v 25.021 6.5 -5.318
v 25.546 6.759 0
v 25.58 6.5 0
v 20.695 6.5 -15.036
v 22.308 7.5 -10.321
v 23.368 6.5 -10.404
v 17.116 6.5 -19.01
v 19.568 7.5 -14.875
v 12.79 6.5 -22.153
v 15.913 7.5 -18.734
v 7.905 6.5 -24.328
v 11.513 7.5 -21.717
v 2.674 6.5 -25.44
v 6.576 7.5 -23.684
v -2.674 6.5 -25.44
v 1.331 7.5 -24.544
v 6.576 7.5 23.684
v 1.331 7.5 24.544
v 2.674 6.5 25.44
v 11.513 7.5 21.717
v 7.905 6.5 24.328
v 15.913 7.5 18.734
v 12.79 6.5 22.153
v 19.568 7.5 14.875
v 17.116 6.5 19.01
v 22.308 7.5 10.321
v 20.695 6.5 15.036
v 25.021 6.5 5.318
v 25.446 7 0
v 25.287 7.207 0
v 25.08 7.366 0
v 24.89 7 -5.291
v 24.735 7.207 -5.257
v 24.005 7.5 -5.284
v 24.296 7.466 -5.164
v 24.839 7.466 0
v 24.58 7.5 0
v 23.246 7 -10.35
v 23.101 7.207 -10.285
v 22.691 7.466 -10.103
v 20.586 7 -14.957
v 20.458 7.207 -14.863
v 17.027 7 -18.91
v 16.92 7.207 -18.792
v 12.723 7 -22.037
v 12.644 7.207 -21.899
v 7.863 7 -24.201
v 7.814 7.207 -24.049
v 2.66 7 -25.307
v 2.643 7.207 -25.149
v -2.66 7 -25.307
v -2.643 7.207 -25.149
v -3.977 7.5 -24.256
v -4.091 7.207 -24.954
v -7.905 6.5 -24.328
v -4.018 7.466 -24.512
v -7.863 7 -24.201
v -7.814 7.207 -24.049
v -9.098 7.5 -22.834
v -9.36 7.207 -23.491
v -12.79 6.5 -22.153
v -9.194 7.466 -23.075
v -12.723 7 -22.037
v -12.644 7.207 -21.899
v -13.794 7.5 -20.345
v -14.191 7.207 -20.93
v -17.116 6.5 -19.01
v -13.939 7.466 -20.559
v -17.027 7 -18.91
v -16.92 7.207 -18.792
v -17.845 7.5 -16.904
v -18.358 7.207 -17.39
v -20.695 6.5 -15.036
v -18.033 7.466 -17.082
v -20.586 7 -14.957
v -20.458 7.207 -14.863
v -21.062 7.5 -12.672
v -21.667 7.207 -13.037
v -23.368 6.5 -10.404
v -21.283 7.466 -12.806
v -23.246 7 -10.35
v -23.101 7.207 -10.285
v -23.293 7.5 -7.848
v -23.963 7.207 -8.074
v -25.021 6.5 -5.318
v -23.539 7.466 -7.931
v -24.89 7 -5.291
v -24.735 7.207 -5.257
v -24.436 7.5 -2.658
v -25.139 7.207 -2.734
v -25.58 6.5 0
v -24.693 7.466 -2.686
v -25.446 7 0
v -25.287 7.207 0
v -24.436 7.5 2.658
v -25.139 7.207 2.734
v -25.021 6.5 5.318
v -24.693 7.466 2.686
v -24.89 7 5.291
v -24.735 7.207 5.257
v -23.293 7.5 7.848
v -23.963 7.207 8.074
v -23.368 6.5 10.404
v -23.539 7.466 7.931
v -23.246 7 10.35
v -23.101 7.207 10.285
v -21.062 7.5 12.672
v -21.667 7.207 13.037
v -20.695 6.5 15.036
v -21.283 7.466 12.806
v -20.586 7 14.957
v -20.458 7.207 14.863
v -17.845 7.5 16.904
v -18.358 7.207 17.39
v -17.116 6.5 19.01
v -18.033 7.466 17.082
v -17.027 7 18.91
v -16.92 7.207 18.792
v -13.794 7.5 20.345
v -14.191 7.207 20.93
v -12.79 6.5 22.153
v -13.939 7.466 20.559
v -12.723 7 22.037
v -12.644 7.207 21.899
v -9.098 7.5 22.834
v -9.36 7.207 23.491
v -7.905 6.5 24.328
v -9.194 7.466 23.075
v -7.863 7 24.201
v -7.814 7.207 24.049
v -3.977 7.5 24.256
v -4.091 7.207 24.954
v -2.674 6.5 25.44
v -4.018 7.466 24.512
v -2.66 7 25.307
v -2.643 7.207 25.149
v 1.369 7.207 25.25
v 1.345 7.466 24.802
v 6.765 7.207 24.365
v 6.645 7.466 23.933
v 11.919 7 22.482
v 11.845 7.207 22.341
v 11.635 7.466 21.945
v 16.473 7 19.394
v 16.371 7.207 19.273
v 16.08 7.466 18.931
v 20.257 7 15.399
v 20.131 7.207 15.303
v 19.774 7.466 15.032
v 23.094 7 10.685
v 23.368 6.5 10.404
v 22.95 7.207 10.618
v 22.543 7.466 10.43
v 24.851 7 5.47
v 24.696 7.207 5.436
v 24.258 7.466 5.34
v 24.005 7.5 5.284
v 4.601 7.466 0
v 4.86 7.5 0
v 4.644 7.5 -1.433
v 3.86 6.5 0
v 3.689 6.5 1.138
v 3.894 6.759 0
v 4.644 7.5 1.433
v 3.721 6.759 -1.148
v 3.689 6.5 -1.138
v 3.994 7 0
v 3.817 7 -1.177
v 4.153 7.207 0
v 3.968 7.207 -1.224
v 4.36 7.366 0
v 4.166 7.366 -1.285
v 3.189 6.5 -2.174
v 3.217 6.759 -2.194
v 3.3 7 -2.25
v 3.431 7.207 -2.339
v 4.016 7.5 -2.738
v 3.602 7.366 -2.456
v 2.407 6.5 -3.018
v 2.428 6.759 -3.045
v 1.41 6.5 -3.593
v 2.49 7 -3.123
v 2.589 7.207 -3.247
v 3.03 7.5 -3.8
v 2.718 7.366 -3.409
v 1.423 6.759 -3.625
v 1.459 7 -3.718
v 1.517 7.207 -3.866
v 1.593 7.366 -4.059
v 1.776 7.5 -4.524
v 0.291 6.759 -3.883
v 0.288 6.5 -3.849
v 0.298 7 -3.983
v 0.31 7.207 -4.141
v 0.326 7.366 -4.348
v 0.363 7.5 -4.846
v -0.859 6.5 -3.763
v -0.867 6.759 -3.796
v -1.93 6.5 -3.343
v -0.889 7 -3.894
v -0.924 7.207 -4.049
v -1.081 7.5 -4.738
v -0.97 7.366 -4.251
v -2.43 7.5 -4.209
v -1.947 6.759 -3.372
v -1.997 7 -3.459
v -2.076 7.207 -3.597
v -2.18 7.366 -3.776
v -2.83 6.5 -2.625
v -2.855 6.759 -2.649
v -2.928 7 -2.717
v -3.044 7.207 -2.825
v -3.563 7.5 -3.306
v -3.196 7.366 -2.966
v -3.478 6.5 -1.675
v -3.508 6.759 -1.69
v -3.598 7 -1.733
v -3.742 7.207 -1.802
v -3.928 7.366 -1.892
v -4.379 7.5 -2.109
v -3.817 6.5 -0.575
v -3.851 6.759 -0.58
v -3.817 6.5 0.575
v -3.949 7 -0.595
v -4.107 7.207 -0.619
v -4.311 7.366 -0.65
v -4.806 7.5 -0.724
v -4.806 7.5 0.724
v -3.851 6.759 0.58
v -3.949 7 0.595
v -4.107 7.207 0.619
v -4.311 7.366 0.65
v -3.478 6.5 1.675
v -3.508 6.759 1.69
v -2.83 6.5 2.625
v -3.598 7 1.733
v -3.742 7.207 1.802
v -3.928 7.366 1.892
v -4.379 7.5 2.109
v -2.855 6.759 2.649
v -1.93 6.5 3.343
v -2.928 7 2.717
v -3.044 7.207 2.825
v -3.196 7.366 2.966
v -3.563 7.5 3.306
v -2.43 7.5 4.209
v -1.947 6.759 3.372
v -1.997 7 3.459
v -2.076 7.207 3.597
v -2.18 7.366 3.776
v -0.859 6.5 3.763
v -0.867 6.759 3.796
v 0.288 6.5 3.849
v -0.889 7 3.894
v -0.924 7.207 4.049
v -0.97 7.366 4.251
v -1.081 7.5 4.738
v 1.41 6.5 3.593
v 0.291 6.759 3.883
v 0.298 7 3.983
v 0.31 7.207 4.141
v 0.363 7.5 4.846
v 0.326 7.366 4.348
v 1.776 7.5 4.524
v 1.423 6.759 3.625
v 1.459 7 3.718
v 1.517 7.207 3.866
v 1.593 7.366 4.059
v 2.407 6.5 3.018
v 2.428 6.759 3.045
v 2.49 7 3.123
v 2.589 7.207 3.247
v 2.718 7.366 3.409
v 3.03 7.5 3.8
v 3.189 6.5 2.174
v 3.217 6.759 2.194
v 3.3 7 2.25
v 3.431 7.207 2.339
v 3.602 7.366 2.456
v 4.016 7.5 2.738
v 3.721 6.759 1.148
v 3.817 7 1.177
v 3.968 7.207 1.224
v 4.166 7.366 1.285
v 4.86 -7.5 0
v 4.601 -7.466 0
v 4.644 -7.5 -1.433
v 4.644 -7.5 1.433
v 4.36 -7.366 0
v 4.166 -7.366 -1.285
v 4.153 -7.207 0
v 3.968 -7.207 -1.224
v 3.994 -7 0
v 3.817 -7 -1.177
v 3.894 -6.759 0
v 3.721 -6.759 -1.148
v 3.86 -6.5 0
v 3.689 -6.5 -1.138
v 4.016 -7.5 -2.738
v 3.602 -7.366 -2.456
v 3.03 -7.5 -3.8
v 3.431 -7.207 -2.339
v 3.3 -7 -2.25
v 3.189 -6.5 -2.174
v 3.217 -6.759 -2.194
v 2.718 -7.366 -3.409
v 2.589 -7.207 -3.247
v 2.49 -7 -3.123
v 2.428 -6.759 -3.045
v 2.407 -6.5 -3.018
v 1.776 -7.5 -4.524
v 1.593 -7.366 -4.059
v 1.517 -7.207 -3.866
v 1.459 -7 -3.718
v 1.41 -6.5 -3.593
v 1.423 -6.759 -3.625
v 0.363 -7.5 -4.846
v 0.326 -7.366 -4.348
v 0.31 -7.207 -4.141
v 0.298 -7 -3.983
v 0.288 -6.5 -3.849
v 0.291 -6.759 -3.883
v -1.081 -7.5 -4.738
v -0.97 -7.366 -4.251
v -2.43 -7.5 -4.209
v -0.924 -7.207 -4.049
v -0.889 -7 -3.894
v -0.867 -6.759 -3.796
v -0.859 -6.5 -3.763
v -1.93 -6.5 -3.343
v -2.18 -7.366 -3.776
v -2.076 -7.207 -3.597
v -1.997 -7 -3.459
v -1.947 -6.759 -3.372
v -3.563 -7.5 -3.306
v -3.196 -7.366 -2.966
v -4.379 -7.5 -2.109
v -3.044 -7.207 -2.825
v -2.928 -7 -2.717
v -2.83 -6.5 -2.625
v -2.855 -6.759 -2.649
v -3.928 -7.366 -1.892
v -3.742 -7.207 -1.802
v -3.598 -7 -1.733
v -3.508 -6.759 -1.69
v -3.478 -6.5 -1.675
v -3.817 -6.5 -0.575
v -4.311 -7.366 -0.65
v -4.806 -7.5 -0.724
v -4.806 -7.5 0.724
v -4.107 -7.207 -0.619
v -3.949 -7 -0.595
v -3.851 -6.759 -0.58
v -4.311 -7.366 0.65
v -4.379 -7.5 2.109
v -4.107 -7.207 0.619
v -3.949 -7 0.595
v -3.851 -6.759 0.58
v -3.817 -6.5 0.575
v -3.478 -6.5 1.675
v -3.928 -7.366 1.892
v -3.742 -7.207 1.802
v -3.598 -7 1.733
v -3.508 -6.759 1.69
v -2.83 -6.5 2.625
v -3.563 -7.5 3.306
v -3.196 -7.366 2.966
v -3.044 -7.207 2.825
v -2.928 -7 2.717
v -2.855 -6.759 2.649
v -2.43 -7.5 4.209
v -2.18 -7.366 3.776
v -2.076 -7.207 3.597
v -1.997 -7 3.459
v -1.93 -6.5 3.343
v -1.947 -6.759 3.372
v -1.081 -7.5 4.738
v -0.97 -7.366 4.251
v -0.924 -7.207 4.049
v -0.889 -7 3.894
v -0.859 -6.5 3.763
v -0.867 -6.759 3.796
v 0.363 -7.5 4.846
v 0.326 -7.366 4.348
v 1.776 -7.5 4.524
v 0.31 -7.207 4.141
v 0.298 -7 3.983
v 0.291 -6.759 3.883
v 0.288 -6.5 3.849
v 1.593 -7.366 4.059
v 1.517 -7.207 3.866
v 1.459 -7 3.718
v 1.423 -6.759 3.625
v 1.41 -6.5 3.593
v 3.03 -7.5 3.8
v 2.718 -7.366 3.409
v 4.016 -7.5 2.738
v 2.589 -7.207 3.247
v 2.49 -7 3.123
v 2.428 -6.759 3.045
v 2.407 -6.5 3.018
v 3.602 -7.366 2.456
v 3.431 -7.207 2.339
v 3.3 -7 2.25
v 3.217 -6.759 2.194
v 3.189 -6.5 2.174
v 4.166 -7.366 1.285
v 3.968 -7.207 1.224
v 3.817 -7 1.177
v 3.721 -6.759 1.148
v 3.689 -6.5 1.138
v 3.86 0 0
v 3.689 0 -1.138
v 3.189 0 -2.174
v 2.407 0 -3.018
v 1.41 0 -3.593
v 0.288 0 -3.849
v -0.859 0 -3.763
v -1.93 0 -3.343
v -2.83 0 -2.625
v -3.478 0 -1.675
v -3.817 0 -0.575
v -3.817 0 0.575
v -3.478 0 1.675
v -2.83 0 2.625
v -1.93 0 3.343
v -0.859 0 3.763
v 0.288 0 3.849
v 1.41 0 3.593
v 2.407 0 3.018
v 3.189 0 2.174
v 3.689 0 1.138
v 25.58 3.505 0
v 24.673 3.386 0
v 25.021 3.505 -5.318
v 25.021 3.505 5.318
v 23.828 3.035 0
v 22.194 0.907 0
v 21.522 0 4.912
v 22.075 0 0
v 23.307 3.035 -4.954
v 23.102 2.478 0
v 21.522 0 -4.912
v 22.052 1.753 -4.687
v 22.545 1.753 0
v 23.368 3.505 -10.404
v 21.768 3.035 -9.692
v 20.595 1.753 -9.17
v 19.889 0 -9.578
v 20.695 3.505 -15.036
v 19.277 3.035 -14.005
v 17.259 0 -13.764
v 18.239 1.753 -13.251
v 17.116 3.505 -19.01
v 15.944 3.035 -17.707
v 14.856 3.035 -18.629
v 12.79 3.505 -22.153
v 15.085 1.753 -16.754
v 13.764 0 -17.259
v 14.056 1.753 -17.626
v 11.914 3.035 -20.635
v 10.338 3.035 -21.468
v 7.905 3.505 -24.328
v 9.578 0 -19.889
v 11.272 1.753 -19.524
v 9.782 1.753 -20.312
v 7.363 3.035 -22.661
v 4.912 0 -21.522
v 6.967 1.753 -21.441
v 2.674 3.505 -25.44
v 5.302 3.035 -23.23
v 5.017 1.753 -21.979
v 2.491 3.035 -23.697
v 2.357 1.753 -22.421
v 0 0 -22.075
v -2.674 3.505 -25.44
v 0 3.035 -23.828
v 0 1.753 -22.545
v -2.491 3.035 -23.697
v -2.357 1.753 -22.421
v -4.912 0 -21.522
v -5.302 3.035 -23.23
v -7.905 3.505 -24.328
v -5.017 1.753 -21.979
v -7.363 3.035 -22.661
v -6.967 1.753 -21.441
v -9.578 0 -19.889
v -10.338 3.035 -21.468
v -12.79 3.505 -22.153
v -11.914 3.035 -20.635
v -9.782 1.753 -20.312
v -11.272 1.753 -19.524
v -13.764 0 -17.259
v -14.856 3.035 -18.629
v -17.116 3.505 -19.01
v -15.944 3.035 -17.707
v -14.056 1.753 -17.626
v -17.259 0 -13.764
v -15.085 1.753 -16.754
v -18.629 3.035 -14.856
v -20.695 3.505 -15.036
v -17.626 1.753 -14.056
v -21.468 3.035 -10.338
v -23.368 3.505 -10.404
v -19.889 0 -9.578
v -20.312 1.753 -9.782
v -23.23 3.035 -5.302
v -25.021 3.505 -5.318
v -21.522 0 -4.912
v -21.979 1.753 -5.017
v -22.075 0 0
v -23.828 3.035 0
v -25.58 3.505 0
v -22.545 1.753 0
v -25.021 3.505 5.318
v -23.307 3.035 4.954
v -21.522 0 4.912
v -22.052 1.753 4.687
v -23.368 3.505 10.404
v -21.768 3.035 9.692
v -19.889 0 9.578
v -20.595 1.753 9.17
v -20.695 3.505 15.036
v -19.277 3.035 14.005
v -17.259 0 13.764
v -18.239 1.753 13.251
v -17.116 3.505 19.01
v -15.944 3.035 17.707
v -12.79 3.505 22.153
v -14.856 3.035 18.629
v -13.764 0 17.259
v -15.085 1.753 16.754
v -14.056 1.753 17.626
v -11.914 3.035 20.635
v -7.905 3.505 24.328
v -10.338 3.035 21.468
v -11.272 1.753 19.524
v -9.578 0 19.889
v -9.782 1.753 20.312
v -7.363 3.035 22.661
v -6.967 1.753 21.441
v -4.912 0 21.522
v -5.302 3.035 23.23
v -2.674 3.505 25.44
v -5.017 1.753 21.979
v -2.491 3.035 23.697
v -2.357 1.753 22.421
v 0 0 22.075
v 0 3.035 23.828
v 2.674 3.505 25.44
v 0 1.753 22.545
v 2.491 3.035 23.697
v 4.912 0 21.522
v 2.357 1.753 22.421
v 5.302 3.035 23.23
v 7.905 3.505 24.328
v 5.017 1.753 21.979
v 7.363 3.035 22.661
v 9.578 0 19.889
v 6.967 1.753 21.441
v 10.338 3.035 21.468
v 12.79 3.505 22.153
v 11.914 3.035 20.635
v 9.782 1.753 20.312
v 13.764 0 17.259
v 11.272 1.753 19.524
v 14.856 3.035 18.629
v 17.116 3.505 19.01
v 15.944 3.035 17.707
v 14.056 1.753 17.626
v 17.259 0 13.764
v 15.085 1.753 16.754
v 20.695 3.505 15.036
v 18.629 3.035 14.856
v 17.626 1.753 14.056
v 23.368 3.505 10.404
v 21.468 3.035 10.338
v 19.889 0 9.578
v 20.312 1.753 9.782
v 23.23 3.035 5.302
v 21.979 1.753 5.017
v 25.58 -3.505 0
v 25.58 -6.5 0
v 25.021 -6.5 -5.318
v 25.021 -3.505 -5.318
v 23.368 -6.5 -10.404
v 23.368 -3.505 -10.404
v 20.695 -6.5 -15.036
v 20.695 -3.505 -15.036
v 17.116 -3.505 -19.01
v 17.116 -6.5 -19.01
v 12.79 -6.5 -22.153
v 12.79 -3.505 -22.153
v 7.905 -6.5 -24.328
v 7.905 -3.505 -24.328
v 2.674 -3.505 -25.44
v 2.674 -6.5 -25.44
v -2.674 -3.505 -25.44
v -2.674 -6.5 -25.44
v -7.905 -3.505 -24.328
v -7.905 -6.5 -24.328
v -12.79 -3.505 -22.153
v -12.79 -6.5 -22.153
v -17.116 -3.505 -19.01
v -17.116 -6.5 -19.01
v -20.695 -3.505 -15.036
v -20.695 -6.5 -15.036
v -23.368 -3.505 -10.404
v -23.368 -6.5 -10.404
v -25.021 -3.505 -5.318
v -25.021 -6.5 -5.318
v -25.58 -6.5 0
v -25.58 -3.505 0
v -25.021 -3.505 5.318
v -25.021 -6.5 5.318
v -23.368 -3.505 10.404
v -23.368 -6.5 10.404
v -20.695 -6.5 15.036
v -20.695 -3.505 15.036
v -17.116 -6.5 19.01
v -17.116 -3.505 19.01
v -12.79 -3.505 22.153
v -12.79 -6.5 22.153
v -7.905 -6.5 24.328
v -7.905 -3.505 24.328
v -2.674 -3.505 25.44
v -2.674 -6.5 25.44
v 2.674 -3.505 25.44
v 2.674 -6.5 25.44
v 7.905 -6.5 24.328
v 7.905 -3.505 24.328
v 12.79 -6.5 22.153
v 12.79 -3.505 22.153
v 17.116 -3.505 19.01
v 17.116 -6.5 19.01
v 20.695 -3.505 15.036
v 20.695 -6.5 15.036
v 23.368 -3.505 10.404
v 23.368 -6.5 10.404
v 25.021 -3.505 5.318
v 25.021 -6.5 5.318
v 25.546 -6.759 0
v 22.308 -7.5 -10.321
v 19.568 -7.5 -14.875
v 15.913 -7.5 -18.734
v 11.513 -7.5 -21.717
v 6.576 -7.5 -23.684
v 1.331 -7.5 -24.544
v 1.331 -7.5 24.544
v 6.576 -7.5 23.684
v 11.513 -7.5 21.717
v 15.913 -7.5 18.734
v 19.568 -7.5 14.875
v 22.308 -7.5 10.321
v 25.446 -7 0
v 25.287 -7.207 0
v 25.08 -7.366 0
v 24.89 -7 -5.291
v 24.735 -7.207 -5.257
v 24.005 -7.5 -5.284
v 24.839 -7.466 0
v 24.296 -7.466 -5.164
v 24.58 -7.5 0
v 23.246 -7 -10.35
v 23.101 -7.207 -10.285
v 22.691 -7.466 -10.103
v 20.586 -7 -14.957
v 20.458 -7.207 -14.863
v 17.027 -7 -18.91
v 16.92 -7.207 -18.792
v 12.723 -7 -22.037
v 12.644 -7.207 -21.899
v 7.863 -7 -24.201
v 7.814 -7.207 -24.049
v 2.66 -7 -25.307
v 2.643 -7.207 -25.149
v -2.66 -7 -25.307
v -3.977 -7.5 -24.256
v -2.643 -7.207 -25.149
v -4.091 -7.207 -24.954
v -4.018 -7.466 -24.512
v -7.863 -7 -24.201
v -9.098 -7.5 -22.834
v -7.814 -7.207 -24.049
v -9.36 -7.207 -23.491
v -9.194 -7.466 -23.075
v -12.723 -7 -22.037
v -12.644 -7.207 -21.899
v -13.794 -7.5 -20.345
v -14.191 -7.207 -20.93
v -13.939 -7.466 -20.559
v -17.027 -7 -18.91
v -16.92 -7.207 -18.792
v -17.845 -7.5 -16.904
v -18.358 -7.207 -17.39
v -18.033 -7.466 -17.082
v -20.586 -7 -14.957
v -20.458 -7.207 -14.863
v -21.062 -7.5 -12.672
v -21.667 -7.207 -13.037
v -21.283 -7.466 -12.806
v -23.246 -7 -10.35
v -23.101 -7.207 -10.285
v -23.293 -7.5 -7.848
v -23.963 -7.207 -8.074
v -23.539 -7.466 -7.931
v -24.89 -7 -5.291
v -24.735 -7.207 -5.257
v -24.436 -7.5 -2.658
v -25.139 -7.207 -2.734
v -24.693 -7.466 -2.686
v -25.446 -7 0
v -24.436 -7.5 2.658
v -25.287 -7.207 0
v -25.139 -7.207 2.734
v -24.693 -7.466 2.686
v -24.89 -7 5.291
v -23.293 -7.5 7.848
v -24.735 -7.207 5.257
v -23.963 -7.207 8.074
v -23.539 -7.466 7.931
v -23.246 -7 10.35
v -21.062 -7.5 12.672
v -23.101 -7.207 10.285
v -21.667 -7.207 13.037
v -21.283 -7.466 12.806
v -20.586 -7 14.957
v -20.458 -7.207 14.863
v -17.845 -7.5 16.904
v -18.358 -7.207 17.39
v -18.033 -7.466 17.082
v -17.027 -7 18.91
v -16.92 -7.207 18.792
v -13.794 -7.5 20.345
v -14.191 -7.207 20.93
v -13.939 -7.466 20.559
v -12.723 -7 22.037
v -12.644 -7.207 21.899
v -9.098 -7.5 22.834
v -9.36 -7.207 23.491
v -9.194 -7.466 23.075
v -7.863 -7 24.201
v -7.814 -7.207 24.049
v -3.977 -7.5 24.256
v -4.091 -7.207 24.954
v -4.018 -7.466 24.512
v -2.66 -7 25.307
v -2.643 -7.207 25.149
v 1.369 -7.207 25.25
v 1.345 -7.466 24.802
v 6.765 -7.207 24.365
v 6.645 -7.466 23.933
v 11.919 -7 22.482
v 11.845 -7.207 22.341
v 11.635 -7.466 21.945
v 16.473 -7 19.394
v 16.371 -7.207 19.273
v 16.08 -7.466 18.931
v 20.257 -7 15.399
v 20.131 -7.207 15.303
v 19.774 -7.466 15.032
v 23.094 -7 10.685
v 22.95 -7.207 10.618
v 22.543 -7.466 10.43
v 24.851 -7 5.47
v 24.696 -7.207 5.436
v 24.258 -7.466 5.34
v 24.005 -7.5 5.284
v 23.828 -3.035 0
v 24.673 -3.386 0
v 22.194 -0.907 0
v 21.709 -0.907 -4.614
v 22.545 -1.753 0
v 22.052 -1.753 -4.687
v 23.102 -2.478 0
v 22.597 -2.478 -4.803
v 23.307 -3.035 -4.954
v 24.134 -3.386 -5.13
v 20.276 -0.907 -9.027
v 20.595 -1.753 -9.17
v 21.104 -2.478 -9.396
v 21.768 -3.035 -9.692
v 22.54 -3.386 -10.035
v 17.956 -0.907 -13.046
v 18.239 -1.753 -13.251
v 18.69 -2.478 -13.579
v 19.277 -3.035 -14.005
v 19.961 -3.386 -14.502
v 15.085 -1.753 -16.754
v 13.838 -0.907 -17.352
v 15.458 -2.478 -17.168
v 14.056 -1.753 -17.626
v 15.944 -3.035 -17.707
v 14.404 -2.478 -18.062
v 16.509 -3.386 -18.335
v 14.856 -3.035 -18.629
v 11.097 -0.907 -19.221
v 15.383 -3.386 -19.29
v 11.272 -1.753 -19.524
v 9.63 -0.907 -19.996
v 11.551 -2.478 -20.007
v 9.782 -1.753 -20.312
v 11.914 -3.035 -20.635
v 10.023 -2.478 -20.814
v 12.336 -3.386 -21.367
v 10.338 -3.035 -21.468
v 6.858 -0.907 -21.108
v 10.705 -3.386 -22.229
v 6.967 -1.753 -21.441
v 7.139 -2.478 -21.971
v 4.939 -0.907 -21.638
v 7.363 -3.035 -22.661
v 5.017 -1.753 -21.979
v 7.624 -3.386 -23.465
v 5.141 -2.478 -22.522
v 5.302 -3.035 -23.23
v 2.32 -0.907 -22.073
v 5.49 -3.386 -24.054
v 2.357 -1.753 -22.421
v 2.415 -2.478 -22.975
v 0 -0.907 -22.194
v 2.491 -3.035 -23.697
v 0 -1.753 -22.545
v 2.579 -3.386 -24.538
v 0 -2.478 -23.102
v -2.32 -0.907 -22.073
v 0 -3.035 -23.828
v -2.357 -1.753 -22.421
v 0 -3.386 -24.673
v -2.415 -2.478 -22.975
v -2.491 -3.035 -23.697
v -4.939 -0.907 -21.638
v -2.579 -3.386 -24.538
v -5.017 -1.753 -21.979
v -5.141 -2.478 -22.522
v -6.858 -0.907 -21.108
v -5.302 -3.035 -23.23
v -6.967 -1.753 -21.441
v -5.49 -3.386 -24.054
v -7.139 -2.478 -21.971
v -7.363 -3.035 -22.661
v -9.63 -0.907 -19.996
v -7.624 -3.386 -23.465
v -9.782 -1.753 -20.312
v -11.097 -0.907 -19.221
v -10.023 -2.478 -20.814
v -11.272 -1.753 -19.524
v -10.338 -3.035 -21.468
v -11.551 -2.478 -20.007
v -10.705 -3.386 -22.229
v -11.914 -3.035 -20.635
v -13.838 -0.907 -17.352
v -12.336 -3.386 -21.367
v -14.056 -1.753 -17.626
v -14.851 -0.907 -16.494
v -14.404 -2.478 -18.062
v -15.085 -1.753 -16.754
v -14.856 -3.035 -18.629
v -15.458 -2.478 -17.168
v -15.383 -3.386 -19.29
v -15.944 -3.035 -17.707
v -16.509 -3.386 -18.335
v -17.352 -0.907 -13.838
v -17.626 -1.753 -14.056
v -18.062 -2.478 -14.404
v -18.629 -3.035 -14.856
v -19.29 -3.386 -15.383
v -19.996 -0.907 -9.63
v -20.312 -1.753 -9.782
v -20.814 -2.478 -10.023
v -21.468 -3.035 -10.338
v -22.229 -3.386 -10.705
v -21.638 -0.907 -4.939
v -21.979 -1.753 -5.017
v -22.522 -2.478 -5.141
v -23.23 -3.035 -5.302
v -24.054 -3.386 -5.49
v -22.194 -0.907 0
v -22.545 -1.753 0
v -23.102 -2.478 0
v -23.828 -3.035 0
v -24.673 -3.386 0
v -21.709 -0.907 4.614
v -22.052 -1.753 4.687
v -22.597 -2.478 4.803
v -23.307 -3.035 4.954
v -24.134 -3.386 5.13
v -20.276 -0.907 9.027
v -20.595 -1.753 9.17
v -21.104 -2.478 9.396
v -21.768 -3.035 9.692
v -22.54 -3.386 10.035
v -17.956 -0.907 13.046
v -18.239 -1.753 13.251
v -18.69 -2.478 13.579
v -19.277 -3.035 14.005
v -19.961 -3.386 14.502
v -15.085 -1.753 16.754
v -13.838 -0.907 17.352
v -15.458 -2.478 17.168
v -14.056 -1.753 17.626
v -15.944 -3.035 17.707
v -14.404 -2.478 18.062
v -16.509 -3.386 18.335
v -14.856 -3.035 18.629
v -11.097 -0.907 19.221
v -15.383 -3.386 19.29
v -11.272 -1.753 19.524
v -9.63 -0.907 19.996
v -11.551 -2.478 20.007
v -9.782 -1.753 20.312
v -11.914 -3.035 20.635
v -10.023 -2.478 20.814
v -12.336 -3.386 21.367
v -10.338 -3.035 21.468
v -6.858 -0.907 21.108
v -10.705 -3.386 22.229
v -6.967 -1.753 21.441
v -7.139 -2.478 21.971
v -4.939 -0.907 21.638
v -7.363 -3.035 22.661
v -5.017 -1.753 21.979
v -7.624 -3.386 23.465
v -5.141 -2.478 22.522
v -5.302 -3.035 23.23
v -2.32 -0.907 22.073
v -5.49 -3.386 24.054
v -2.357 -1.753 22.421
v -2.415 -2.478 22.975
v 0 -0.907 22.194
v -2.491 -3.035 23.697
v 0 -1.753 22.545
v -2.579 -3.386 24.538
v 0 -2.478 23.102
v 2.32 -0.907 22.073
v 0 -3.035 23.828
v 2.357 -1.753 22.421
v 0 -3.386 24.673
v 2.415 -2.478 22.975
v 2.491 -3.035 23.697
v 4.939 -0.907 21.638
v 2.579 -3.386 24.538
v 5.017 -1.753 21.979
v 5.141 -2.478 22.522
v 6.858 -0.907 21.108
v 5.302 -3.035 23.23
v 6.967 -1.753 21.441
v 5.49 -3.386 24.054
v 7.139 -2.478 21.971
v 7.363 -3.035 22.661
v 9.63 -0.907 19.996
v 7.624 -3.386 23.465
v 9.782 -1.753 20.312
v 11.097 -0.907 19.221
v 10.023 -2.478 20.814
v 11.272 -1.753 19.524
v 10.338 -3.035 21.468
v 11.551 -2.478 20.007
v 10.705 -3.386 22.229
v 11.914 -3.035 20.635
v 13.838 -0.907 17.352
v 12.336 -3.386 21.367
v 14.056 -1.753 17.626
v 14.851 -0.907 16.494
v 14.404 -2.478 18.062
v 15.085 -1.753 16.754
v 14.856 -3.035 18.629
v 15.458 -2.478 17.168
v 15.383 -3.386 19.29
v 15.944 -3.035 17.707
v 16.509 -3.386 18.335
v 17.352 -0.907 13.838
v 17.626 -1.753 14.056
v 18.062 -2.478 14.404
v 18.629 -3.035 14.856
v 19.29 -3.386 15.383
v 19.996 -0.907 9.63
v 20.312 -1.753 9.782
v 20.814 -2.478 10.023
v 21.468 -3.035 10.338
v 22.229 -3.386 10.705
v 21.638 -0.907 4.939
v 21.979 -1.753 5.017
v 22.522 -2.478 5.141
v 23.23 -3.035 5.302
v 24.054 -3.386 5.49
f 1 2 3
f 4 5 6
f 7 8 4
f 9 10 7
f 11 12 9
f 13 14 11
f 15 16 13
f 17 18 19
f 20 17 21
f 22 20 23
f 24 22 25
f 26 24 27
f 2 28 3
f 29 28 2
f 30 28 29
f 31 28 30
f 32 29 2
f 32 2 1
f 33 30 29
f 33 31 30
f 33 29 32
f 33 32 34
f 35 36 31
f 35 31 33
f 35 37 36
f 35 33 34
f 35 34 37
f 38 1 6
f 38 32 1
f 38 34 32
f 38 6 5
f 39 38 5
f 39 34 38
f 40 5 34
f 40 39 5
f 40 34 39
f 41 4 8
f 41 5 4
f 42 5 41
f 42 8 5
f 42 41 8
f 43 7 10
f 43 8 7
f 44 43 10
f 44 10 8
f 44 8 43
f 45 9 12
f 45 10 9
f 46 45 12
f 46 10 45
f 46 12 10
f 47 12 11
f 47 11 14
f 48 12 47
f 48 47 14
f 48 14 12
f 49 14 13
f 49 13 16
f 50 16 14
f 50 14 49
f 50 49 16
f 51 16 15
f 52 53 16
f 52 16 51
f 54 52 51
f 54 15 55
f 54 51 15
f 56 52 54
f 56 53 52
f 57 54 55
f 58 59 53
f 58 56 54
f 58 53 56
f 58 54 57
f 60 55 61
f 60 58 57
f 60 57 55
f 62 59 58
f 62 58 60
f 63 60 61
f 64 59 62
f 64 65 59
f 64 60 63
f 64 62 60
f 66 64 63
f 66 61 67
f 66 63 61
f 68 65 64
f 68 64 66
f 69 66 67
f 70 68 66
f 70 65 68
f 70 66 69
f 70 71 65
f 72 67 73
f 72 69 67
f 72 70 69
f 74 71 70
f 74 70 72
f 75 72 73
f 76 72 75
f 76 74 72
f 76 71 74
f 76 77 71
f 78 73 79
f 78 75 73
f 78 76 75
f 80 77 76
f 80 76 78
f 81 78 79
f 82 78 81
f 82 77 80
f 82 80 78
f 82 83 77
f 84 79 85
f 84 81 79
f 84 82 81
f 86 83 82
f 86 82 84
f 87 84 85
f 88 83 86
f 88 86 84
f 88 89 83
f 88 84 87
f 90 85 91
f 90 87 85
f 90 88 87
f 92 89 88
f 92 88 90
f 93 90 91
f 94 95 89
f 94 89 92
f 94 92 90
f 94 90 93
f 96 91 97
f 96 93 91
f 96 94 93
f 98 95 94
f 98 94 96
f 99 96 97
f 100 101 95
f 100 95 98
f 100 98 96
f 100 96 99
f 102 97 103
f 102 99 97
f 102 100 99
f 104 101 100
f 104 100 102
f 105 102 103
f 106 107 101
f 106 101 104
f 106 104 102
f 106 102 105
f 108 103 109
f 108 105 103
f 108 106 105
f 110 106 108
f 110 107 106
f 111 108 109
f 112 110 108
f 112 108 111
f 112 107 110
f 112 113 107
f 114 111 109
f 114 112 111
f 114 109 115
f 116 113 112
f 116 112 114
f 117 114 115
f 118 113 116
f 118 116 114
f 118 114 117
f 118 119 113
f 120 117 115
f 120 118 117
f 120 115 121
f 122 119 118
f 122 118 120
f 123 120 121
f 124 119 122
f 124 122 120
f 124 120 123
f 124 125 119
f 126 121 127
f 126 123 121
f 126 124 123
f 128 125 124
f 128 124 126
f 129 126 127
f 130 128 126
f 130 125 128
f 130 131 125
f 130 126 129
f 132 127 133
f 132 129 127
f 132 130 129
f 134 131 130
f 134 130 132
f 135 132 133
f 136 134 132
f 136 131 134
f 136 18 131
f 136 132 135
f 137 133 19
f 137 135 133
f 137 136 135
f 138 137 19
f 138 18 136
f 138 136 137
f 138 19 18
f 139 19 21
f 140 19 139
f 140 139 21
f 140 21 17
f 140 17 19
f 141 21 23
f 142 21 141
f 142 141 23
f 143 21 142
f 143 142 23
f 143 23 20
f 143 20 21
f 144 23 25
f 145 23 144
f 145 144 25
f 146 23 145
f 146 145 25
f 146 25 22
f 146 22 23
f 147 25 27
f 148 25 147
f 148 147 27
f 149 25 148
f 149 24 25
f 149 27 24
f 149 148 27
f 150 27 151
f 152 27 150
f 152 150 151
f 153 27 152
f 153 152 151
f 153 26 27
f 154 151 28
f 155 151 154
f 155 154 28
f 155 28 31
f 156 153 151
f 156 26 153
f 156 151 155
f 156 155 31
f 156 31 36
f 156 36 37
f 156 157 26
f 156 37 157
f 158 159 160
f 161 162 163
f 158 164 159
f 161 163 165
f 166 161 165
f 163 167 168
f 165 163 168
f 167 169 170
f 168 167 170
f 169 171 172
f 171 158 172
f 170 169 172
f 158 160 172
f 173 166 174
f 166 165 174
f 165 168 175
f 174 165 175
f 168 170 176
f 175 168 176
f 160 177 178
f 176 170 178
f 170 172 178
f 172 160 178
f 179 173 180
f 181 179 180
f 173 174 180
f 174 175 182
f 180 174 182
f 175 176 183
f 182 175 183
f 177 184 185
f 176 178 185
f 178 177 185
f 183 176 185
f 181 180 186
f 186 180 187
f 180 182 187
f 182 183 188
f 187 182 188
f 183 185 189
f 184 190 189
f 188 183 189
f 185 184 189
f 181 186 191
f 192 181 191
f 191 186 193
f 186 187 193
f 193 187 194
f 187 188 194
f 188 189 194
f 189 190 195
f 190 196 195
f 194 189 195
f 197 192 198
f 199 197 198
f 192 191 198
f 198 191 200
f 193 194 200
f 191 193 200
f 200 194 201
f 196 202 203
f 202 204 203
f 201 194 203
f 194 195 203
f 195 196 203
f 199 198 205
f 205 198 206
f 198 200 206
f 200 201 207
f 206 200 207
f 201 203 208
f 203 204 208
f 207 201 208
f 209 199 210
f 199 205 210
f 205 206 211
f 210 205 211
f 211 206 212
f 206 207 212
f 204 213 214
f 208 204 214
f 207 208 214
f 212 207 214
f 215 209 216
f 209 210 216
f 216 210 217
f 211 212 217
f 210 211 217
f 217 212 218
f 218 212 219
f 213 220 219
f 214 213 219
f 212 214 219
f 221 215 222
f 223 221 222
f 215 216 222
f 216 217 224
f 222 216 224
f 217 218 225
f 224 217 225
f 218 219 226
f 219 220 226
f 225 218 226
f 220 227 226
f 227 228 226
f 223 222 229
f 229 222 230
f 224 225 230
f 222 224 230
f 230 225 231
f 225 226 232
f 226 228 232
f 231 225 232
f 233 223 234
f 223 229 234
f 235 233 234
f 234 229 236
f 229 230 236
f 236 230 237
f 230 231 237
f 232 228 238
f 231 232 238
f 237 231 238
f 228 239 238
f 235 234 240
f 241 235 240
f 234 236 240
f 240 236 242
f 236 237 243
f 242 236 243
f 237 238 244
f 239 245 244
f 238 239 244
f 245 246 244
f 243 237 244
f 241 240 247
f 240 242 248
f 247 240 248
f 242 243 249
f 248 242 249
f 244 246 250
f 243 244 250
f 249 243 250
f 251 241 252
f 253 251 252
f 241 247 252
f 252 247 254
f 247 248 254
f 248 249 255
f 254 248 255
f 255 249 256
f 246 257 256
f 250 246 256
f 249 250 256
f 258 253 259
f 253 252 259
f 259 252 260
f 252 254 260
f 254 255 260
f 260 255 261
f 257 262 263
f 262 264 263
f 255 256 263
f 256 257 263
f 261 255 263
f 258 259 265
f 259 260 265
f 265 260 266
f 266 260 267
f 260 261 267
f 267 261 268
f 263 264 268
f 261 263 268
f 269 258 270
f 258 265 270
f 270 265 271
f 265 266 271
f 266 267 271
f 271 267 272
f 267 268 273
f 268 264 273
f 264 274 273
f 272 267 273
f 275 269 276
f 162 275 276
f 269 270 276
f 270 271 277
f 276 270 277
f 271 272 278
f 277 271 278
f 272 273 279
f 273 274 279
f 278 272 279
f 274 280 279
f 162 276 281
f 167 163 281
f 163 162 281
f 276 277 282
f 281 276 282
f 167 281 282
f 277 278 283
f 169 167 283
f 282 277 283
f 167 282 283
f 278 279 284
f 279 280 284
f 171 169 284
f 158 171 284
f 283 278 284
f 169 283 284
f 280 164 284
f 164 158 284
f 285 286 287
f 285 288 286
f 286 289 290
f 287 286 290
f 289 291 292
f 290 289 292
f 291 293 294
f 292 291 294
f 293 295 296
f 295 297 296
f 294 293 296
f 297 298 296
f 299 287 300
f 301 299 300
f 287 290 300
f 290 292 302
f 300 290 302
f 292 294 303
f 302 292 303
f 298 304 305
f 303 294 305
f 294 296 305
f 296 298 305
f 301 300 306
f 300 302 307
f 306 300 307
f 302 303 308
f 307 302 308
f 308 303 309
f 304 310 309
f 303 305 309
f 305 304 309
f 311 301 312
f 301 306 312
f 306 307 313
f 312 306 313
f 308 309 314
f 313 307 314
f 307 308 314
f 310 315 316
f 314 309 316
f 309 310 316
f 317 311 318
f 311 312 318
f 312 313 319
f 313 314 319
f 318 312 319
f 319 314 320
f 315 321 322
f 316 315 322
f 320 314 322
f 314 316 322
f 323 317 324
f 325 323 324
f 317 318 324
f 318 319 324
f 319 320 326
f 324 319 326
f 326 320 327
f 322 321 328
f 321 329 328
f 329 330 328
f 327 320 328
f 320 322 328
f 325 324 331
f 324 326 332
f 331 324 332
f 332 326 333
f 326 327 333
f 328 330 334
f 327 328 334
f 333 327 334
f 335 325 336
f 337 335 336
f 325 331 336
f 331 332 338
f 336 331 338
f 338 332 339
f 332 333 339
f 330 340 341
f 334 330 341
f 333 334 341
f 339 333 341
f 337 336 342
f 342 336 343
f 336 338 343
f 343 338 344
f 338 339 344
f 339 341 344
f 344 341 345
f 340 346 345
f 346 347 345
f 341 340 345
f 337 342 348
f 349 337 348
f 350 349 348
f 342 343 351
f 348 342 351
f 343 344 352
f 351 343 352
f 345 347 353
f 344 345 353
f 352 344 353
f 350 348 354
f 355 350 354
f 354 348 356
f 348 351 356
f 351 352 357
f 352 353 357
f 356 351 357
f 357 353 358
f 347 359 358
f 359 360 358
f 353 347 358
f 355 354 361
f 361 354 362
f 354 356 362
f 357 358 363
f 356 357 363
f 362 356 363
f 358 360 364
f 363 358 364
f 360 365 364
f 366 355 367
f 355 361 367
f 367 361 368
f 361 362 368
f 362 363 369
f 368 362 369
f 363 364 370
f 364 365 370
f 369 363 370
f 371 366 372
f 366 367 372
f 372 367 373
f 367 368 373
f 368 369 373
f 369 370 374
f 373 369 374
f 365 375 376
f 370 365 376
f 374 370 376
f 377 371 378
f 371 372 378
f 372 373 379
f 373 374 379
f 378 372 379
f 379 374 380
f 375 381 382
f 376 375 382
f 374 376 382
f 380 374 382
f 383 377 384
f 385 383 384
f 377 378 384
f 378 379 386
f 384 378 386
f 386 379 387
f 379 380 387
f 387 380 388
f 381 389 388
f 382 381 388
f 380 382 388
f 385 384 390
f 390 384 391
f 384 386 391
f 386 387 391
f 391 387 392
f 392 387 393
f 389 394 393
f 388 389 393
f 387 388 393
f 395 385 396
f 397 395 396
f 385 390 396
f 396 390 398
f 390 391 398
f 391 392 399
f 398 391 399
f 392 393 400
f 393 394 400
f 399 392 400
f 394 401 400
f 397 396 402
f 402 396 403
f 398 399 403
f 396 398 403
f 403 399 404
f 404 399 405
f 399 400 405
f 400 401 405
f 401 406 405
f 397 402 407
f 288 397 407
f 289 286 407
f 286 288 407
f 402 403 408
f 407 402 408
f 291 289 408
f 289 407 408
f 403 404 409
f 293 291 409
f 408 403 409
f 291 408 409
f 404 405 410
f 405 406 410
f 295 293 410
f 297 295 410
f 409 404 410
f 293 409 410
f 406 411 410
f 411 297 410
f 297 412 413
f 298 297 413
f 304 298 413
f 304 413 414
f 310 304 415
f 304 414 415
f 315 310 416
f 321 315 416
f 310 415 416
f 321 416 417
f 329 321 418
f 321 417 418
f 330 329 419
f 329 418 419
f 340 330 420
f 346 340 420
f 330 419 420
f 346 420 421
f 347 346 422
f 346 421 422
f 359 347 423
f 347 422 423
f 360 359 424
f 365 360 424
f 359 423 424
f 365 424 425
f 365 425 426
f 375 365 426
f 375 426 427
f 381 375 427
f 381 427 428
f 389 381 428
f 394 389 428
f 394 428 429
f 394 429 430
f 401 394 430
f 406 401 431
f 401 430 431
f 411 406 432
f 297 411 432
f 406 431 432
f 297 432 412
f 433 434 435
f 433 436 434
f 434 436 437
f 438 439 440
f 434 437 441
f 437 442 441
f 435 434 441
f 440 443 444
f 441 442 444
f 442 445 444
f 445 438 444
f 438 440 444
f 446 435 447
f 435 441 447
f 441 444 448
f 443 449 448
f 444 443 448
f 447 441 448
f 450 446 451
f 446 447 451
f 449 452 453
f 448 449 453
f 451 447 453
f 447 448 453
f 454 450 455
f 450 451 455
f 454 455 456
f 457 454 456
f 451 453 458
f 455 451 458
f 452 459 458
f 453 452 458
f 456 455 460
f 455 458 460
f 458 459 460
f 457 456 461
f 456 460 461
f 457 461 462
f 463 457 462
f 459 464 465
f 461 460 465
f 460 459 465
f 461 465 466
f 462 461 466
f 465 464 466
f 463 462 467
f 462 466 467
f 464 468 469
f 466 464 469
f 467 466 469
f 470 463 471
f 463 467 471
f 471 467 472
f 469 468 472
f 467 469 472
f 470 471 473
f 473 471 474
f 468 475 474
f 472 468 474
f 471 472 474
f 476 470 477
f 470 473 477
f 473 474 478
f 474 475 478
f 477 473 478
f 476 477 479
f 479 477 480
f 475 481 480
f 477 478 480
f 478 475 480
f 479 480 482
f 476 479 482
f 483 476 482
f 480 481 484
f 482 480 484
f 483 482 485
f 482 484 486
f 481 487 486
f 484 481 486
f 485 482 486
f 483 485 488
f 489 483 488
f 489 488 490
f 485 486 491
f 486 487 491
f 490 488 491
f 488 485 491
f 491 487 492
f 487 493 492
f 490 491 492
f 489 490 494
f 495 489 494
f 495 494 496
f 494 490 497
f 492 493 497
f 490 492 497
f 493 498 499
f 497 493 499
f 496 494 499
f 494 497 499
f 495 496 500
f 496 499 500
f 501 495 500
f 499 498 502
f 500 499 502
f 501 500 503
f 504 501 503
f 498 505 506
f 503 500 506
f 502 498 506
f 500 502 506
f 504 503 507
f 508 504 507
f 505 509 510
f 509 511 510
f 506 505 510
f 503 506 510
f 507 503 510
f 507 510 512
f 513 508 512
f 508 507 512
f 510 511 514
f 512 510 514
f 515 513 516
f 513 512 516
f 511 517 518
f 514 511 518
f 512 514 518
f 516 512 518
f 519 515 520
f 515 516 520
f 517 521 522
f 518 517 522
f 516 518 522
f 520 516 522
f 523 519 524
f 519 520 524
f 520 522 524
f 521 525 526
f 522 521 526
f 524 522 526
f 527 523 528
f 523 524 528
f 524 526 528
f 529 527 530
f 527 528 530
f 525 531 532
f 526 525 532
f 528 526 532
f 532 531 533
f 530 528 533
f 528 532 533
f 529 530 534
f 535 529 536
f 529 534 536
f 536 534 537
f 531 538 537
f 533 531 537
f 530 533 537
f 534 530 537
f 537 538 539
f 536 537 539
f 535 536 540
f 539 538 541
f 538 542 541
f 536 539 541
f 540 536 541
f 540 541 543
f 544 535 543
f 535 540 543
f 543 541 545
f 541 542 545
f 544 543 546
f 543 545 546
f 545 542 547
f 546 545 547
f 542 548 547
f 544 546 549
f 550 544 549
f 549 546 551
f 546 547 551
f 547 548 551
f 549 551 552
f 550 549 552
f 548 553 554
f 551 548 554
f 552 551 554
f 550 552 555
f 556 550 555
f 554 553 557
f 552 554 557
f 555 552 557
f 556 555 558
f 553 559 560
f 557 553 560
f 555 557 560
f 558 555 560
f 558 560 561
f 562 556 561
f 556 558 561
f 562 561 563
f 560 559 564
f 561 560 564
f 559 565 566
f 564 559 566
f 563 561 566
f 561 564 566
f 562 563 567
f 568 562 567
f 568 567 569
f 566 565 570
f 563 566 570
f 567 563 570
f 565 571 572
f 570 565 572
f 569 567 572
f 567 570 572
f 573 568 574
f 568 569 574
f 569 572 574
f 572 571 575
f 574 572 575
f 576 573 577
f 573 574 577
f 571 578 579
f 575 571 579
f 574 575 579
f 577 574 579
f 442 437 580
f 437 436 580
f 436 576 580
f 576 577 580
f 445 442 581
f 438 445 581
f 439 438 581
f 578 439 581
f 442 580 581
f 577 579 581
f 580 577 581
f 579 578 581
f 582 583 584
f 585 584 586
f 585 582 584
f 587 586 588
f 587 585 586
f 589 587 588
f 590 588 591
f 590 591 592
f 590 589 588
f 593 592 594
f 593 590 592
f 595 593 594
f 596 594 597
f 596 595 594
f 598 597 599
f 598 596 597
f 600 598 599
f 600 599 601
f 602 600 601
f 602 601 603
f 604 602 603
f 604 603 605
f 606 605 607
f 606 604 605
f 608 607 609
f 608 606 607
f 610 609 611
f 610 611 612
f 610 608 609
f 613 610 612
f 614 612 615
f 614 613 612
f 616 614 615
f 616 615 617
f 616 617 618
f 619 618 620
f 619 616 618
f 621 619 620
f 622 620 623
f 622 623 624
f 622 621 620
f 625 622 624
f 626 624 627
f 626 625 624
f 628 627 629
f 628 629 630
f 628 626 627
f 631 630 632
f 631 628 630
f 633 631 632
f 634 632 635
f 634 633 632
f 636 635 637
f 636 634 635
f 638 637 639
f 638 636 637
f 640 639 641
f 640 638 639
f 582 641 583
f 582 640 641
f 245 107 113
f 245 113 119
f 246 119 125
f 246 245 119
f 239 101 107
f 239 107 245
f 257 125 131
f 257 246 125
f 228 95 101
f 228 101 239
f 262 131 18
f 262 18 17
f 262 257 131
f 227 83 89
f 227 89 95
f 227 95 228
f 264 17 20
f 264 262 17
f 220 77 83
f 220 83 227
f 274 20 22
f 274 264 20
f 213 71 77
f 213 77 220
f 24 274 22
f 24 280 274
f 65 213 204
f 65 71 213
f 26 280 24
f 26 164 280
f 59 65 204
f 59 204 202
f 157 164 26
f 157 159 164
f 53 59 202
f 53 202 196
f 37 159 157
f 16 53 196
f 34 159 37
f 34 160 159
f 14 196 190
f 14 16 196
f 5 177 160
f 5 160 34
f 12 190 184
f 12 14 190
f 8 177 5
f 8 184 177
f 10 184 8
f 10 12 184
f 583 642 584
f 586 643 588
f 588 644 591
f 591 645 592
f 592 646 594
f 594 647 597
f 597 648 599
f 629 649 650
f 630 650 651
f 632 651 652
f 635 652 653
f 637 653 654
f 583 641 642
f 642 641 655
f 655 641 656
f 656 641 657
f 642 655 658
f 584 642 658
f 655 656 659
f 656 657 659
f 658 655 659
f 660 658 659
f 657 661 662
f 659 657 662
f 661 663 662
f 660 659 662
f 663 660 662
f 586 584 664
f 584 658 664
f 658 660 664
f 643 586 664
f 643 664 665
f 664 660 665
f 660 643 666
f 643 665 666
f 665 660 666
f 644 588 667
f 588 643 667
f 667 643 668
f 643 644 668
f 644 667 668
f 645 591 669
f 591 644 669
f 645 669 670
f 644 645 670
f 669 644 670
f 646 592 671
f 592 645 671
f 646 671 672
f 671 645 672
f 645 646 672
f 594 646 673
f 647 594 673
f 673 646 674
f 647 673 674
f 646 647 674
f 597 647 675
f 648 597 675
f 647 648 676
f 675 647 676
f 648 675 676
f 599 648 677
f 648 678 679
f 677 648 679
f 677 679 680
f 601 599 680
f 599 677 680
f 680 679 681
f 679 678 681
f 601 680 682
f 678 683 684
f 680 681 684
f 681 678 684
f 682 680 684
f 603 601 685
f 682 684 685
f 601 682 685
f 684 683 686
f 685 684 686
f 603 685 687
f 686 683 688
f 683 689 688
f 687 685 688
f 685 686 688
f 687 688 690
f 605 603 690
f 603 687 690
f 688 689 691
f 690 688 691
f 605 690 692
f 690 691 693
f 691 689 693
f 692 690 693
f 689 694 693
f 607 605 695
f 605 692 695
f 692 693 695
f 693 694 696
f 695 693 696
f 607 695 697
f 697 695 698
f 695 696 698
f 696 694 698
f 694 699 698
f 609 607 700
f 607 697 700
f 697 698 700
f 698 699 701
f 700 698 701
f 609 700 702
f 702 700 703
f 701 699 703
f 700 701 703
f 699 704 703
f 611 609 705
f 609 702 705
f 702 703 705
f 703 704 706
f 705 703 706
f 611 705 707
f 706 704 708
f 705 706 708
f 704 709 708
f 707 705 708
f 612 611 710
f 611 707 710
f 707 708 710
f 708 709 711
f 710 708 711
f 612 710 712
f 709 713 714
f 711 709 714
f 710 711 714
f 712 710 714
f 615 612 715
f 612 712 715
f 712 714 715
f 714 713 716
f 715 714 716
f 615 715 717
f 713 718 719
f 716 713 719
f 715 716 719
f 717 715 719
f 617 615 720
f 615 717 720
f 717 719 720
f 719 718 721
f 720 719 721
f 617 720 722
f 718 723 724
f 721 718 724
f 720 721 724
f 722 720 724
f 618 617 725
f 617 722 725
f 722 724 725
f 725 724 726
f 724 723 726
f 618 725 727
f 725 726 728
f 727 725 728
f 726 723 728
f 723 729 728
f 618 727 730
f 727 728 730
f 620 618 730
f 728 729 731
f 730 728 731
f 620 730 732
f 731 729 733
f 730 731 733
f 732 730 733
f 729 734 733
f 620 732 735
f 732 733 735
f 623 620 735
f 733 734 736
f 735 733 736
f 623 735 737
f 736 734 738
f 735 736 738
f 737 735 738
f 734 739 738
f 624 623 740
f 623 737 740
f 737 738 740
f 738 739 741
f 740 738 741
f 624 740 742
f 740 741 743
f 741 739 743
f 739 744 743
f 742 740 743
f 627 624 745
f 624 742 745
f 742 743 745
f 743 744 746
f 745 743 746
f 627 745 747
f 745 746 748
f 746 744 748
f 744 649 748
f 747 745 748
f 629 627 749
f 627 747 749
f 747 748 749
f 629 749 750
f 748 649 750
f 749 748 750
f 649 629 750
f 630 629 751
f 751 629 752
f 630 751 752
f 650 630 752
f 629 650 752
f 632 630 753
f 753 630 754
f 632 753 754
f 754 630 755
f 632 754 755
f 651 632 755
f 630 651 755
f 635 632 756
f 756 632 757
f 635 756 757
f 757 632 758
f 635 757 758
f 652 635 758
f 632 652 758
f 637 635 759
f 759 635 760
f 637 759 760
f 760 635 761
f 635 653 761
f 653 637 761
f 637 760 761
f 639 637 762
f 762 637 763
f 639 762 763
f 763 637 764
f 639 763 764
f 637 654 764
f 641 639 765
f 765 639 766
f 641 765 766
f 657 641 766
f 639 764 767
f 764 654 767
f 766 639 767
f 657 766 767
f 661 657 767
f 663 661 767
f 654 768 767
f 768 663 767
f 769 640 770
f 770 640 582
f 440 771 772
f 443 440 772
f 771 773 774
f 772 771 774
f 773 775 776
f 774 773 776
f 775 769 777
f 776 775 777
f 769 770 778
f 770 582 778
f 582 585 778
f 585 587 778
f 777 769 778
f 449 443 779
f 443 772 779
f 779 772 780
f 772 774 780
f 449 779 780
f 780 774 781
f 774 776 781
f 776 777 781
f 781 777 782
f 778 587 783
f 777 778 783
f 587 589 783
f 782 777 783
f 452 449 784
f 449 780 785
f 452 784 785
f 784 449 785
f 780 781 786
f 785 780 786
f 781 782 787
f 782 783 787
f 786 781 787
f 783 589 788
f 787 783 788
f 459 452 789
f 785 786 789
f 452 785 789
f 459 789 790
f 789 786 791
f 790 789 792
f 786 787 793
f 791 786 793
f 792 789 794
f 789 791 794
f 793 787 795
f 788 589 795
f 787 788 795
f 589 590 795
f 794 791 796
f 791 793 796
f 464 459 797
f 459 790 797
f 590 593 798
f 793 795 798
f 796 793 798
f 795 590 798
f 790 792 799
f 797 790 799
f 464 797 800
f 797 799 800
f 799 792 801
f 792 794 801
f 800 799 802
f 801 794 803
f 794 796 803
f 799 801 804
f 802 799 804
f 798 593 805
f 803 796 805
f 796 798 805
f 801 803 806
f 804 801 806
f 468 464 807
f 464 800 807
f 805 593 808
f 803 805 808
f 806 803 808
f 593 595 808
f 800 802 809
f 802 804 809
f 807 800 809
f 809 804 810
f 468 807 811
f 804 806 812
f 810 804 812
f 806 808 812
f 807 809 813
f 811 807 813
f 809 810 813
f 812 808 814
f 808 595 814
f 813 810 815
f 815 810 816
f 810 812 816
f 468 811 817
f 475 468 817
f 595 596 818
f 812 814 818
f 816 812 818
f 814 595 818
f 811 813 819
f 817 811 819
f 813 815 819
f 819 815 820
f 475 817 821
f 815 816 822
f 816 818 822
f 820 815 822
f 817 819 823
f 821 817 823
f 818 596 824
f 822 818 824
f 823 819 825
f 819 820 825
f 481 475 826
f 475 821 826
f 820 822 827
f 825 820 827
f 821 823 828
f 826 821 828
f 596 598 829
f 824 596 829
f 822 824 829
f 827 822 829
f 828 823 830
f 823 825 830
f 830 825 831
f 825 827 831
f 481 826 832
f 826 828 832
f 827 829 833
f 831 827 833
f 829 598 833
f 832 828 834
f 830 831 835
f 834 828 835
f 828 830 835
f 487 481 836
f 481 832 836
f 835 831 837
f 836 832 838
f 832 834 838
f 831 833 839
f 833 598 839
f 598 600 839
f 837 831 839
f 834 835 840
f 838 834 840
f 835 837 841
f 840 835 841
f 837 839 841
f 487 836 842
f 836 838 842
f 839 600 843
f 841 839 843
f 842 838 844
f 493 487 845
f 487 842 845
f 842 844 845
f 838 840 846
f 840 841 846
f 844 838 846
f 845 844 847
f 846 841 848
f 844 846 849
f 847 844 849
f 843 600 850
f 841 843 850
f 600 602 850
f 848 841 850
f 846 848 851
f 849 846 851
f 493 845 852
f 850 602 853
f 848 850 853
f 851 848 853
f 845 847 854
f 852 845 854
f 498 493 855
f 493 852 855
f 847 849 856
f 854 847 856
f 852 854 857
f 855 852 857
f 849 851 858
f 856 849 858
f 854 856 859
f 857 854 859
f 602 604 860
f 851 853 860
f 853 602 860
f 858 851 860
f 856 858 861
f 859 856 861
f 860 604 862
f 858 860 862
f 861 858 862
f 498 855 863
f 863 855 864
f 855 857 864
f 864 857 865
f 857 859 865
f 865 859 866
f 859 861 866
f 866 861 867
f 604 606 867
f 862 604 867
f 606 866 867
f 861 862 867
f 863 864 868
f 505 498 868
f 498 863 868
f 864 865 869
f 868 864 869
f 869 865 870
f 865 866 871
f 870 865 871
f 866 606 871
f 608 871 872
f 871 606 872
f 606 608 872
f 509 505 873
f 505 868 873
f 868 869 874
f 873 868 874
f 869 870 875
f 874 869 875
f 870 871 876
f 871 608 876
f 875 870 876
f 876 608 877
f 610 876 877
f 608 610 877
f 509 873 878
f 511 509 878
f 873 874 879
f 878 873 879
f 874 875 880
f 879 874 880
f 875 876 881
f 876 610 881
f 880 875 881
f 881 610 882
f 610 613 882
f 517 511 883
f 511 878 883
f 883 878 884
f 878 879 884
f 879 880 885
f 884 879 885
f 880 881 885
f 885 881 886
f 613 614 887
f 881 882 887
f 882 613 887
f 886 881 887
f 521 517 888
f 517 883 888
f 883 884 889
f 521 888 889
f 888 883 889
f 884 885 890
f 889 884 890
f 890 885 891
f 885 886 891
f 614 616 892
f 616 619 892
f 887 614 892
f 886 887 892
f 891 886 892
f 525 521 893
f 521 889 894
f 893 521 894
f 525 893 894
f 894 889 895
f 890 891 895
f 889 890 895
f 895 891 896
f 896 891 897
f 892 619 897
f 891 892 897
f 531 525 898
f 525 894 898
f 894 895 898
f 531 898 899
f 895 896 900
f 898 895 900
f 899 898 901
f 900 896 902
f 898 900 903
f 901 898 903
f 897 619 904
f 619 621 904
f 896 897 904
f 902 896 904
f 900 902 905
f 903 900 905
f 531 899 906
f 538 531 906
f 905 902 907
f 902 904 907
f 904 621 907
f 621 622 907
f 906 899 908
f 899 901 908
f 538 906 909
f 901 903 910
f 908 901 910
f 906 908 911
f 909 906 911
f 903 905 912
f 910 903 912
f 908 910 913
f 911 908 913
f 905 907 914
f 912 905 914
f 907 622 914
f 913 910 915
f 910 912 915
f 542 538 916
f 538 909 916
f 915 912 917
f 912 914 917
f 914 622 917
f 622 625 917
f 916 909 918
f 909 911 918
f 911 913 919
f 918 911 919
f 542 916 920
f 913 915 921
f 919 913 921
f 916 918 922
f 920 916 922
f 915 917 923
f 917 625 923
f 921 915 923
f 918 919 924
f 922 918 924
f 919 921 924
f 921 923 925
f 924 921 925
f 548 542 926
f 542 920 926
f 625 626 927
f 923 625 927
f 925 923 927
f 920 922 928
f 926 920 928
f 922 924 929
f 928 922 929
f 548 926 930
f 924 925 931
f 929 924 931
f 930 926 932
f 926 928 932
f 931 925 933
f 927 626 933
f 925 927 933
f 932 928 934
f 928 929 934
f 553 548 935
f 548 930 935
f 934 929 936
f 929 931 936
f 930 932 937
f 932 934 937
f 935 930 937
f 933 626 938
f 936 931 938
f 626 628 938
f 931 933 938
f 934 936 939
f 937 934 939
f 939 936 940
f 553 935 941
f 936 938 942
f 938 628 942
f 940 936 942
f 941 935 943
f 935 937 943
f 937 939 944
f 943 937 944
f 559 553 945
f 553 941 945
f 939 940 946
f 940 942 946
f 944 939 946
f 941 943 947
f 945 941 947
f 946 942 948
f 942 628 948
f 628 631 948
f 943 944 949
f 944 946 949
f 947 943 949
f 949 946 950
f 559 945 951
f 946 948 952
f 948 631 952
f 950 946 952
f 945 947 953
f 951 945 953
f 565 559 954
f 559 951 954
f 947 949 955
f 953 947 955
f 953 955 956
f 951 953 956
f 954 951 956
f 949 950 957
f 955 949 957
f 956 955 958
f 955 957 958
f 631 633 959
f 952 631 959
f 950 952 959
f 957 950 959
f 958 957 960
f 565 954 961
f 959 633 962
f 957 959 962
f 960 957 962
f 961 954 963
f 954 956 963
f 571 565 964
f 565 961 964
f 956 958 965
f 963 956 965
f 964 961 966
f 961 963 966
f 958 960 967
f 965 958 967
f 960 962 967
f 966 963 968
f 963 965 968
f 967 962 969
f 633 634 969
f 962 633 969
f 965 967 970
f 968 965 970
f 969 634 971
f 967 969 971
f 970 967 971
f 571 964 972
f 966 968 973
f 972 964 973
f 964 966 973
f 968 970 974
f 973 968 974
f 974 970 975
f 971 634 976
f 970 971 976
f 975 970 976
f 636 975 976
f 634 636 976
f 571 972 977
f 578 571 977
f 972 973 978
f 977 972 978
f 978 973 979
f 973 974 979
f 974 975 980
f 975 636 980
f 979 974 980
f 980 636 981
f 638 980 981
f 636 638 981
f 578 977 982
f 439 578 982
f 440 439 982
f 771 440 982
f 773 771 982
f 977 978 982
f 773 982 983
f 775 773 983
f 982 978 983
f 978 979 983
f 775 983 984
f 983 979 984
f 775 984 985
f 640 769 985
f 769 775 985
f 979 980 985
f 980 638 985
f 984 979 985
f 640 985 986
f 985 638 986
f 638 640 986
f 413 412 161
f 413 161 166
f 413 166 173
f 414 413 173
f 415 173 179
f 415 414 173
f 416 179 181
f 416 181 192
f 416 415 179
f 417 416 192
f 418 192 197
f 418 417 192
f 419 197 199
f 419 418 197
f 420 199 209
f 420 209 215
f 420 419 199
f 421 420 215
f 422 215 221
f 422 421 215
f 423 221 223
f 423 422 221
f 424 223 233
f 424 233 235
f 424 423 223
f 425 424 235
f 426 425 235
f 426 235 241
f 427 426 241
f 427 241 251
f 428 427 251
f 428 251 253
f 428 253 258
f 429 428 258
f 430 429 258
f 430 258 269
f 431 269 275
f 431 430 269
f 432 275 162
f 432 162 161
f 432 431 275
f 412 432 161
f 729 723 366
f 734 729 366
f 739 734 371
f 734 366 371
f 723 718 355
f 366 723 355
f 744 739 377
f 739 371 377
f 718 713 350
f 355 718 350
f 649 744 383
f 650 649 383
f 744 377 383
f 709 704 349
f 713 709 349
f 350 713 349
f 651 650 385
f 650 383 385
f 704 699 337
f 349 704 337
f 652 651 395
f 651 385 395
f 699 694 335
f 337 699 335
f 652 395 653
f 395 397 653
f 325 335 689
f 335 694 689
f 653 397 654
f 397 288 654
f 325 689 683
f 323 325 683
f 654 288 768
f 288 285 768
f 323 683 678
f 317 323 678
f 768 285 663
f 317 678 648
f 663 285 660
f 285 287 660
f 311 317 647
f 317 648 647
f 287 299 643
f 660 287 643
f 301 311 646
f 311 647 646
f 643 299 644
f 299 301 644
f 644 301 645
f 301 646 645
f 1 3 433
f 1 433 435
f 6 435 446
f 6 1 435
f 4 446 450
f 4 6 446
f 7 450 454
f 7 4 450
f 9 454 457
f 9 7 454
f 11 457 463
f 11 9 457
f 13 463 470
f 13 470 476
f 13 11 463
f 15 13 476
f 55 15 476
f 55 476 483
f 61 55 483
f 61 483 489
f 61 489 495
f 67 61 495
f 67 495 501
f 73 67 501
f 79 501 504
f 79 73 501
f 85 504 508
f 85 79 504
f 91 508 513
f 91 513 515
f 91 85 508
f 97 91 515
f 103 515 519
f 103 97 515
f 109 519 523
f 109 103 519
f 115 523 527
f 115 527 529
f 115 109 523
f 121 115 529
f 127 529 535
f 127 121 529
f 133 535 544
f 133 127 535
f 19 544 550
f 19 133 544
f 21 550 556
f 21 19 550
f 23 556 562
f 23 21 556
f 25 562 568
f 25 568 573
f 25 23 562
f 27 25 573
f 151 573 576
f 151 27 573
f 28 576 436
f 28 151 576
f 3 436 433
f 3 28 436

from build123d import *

# Parameters (mm, degrees)
SALIENTE_EXTRUIR1_DEPTH      = 7.5
SALIENTE_EXTRUIR1_DEPTH_BACK = 7.5
CROQUIS1_R                   = 25.58
CROQUIS1_R_2                 = 3.86
CROQUIS2_R                   = 3.505
REDONDEO1_R                  = 1


with BuildPart() as part:
    # Croquis1 → Saliente-Extruir1 (new, two sides: drawn at the far end of the back side and taken through both)
    with BuildSketch(Plane(origin=(0, 0, 0), x_dir=(1, 0, 0), z_dir=(0, 1, 0)).offset(-SALIENTE_EXTRUIR1_DEPTH_BACK)):
        Circle(CROQUIS1_R)
        Circle(CROQUIS1_R_2, mode=Mode.SUBTRACT)
    extrude(amount=SALIENTE_EXTRUIR1_DEPTH + SALIENTE_EXTRUIR1_DEPTH_BACK)

    # Cortar-Barrer1: sweep along a path in Croquis1<4>
    with BuildLine(Plane(origin=(0, 0, 0), x_dir=(1, 0, 0), z_dir=(0, 1, 0))) as cortar_barrer1_path:
        CenterArc((0, 0), 25.58, 0, 360)
    # Croquis2 → Cortar-Barrer1 (sweep, cut)
    with BuildSketch(Plane.XY):
        with Locations((-25.58, 0)):
            Circle(CROQUIS2_R)
    sweep(path=cortar_barrer1_path.line, mode=Mode.SUBTRACT)

    # Redondeo1
    redondeo1_edges = [part.edges().sort_by_distance(p)[0] for p in [
        (-25.58, -7.5, 0),
        (-25.58, 7.5, 0),
        (-3.86, 7.5, 0),
        (-3.86, -7.5, 0),
    ]]
    fillet(redondeo1_edges, radius=REDONDEO1_R)


solid = part.part
